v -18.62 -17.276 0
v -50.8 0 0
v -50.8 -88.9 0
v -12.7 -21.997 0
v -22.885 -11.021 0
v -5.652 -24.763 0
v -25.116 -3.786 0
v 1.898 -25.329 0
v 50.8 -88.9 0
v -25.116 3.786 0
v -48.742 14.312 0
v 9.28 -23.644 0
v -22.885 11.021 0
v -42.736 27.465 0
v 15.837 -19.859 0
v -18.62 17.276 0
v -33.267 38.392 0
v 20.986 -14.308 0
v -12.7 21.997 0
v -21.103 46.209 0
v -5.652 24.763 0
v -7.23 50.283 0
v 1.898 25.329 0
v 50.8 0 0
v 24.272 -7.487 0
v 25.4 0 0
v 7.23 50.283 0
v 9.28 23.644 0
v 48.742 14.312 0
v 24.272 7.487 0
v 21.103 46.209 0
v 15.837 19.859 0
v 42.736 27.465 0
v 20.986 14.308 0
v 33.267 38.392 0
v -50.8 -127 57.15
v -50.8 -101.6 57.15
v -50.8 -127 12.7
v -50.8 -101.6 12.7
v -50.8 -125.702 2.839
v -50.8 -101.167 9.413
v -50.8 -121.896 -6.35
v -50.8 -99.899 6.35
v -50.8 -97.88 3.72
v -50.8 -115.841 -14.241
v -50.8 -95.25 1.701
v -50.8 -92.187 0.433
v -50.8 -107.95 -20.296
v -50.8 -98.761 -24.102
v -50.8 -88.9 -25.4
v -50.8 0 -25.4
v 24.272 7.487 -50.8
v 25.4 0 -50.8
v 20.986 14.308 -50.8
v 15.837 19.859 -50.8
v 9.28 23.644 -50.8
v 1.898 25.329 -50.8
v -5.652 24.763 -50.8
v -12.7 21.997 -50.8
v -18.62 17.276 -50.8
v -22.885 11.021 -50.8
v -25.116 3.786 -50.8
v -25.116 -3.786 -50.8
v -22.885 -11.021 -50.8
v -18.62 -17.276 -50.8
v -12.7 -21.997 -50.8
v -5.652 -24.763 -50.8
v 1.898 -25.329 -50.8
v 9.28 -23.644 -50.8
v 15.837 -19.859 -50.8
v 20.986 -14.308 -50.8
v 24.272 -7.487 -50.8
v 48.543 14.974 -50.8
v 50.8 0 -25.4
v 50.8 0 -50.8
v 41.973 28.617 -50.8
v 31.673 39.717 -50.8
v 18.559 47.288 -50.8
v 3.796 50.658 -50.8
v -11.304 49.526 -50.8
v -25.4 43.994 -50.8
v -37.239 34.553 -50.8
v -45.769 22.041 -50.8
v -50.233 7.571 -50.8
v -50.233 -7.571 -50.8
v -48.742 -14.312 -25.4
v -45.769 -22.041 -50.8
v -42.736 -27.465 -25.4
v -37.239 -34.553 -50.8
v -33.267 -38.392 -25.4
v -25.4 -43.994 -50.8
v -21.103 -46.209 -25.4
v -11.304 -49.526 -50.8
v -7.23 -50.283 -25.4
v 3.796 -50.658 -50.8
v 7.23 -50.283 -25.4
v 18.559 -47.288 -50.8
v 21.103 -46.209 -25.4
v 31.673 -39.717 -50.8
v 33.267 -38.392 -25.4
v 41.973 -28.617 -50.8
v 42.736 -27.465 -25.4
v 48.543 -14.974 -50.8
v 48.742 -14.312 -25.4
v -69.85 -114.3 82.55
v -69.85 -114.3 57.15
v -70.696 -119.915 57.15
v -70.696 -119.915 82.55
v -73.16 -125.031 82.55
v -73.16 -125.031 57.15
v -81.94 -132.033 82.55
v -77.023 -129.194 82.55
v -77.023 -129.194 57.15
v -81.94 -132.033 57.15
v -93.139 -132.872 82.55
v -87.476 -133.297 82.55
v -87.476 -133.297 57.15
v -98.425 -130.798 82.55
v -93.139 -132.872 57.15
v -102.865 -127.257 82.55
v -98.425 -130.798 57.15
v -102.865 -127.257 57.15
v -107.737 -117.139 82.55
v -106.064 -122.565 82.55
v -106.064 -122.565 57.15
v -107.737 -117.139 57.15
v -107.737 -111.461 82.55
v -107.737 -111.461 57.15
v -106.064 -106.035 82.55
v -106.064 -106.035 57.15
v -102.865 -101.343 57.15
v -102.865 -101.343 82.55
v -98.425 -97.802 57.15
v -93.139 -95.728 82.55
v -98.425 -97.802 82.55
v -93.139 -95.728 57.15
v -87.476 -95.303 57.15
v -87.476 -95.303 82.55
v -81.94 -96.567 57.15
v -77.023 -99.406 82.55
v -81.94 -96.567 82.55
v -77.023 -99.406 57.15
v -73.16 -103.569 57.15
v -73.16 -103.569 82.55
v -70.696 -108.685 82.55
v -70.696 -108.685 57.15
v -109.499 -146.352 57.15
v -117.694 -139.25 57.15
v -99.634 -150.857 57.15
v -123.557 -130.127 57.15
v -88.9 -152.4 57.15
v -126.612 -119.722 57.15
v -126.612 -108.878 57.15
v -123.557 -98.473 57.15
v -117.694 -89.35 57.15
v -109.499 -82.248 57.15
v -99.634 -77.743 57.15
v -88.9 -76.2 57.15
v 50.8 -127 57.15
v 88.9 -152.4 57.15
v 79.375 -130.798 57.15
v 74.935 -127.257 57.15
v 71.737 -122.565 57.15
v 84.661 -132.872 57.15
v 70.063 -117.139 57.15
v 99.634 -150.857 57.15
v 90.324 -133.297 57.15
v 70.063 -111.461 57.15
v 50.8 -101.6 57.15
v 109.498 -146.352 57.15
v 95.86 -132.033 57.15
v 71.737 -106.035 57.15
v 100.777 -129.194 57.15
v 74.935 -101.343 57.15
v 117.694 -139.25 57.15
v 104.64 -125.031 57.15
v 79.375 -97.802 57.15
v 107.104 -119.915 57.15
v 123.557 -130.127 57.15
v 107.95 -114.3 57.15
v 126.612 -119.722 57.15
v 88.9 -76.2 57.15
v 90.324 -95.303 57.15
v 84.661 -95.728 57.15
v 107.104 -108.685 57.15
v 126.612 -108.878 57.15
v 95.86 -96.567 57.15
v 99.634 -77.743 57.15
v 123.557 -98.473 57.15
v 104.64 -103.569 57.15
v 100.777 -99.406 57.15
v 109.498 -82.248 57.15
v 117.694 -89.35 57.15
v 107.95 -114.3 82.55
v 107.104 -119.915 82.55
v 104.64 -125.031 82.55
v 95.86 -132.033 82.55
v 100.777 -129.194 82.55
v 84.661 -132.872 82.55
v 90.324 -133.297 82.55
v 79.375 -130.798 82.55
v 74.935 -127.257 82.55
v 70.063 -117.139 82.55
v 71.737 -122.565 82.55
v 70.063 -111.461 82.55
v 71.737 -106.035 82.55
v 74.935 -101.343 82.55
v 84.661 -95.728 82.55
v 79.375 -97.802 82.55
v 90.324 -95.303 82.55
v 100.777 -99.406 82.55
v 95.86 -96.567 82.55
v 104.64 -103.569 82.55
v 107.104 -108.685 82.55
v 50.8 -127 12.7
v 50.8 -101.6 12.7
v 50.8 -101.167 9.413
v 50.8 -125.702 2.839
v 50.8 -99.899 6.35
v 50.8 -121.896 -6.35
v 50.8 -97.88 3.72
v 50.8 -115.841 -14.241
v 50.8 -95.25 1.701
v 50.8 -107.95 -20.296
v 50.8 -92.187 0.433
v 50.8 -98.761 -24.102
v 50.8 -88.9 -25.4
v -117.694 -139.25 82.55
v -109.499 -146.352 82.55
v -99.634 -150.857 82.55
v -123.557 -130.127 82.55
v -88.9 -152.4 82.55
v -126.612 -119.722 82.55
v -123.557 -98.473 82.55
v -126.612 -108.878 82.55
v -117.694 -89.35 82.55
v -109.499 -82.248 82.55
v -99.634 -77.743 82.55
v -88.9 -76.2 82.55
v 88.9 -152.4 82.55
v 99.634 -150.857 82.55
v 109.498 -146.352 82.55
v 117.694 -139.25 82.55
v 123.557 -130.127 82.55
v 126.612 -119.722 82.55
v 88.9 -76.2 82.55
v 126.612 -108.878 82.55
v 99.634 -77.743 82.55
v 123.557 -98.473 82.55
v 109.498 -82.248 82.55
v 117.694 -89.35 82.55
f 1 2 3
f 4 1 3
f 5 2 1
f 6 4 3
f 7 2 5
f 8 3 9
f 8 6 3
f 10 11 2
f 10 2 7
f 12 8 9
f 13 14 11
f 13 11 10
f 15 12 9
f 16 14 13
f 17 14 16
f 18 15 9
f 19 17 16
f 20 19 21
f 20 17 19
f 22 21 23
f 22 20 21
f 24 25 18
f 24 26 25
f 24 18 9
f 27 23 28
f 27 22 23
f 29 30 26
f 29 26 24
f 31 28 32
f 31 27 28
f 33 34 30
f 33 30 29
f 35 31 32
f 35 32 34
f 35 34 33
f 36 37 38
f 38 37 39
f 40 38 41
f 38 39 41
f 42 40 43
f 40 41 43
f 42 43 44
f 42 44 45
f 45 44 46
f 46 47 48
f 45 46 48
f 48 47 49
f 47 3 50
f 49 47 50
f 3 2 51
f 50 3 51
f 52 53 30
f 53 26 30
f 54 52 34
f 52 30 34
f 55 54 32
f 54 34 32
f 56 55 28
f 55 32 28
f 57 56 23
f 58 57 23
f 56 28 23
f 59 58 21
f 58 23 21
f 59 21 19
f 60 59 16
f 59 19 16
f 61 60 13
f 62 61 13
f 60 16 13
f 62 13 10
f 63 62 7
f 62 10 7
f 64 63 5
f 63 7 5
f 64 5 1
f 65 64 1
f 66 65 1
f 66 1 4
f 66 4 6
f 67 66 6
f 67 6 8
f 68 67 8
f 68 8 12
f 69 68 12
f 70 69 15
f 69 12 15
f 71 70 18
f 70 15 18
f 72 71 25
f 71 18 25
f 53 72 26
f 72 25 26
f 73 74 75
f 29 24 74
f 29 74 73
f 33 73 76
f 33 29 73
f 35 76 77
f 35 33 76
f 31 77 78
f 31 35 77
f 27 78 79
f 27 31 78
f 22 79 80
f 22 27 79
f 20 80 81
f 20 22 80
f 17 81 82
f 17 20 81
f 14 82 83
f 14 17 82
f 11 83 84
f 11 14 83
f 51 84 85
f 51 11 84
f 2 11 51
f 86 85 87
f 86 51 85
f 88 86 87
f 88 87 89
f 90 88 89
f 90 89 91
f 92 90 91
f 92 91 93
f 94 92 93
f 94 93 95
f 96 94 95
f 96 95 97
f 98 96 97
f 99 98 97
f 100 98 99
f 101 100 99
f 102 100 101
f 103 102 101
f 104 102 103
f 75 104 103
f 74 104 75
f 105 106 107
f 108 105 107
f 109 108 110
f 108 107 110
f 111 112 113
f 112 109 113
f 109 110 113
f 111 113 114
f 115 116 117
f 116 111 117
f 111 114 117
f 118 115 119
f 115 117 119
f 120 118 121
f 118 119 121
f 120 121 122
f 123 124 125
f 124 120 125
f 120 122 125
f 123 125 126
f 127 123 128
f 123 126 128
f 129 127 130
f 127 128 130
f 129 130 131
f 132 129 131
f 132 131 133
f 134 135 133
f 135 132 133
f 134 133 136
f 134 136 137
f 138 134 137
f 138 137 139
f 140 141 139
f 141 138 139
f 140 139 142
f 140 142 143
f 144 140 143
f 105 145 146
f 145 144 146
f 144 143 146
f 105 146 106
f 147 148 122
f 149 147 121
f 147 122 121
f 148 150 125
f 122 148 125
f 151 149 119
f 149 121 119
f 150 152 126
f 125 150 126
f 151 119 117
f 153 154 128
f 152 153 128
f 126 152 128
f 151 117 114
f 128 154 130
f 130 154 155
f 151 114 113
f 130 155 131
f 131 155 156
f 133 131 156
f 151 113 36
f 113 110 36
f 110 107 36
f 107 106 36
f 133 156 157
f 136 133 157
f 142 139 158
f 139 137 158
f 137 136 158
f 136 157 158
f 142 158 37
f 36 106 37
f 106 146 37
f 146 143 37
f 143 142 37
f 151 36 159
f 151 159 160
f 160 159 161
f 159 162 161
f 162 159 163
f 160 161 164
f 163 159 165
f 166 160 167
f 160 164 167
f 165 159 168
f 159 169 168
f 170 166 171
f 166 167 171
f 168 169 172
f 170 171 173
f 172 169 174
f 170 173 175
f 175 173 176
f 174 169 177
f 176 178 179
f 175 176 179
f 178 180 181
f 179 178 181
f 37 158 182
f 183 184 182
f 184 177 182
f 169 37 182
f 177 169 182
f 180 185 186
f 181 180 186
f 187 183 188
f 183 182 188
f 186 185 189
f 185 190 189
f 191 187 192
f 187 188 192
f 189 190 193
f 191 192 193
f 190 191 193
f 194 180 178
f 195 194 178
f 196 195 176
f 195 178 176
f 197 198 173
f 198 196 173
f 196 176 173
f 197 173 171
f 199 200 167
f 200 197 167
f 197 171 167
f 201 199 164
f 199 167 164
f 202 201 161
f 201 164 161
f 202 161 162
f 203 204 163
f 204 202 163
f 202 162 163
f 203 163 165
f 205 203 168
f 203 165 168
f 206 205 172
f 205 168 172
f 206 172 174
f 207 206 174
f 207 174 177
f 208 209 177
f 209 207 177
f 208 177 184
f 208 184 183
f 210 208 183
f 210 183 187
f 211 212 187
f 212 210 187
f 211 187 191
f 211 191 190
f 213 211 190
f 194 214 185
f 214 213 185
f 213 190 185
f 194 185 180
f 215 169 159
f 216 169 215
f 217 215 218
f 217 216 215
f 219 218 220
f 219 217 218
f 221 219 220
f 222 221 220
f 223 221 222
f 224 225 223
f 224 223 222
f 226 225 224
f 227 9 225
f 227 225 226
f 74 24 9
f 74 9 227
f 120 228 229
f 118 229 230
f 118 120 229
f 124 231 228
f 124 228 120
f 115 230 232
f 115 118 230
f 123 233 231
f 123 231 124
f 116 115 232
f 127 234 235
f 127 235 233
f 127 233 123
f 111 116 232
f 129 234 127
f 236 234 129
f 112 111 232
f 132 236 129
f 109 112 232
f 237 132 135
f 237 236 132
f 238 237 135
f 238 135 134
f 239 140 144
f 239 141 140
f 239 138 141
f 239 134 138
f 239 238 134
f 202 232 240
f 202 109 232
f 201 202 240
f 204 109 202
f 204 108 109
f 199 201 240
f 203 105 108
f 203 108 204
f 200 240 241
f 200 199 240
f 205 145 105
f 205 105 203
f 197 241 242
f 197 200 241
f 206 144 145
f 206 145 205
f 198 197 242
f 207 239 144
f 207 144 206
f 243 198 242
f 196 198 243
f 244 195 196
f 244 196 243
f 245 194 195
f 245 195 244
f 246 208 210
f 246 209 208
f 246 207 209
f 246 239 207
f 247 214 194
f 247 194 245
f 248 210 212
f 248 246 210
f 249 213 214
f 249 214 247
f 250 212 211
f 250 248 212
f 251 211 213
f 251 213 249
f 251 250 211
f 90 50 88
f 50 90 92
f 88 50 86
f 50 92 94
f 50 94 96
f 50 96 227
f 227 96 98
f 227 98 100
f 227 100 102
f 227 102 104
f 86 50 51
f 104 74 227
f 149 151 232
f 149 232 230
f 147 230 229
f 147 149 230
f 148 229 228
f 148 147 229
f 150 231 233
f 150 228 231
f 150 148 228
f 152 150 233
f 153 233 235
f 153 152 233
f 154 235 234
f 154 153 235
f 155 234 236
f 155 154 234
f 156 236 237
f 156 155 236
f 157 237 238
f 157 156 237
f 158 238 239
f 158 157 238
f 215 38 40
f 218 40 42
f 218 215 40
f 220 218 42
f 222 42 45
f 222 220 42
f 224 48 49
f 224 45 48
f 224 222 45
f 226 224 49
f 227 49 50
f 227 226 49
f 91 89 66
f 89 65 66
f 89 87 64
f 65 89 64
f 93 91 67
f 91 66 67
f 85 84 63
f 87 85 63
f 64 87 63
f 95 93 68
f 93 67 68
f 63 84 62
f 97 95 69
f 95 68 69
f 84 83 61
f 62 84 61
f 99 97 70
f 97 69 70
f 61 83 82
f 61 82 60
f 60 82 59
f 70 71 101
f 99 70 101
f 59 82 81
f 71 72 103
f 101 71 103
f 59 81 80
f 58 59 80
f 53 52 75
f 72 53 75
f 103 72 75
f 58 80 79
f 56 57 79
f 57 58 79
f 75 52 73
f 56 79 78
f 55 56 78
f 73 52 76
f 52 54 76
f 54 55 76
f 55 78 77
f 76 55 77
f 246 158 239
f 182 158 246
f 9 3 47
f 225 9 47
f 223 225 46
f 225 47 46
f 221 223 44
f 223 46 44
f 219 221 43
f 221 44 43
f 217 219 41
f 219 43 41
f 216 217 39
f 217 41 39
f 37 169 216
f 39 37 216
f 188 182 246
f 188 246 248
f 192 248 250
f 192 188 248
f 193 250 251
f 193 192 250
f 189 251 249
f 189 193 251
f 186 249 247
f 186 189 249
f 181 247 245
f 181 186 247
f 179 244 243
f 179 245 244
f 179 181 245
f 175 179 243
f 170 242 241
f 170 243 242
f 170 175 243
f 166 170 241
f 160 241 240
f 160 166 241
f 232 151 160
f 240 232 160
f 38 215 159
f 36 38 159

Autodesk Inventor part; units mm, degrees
ref_plane "YZ Plane" through (0, 0, 0) normal (1, 0, 0) x (0, 1, 0)
ref_plane "XZ Plane" through (0, 0, 0) normal (0, 1, 0) x (-1, 0, 0)
ref_plane "XY Plane" through (0, 0, 0) normal (0, 0, 1) x (1, 0, 0)
sketch "Sketch1" plane through (0, 0, 0) normal (0, 0, 1) x (1, 0, 0)
  circle A0 centre (0, 0) radius 25.4
  circle A1 centre (0, 0) radius 50.8
  dimension "d0" = 50.8
  dimension "d1" = 101.6
extrude "Extrusion1" add sketch "Sketch1" against normal blind 50.8
sketch "Sketch2" plane through (0, 0, 0) normal (0, 0, 1) x (1, 0, 0)
  circle A0 centre (0, 0) radius 50.8 projected
  line L0 (50.8, 0) -> (50.8, -127)
  line L1 (-50.8, 0) -> (-50.8, -127)
  line L2 (-50.8, -127) -> (50.8, -127)
  circle A1 centre (0, 0) radius 50.8
  dimension "d4" = 127
  dimension "d5" = 127
  dimension "d6" = 101.6
extrude "Extrusion2" add sketch "Sketch2" against normal blind 25.4 contours L0 L2 L1 A0
sketch "Sketch3" plane through (50.8, -127, 0) normal (1, 0, 0) x (0, 0, -1)
  line L0 (0, 0) -> (-57.15, 0)
  line L1 (-57.15, 0) -> (-57.15, 25.4)
  line L2 (-57.15, 25.4) -> (0, 25.4)
  line L3 (0, 25.4) -> (0, 0)
  point P0 (0, 127)
  dimension "d9" = 57.15
  dimension "d10" = 25.4
extrude "Extrusion3" add sketch "Sketch3" against normal blind 101.6
fillet "Fillet1" radius 12.7 1 edges at (0, -101.6, 0)
fillet "Fillet2" radius 38.1 1 edges at (0, -127, -25.4)
sketch "Sketch4" plane through (50.8, -127, 57.15) normal (0, 0, 1) x (1, 0, 0)
  line L0 (-139.7001, 50.8) -> (38.0999, 50.8)
  line L1 (-139.7001, -25.4) -> (38.1001, -25.4)
  arc A0 (-139.7001, 50.8) -> (-139.7001, -25.4) centre (-139.7001, 12.7) ccw
  arc A1 (38.1001, -25.4) -> (38.0999, 50.8) centre (38.1, 12.7) ccw
  line L2 (0, 0) -> (-101.6, 0) projected
  line L3 (-50.8, 0) -> (-50.8, -12.1544)
  line L4 (-50.8, -25.4) -> (-50.8, -31.0464)
  circle A2 centre (-139.7001, 12.7) radius 19.05
  circle A3 centre (38.1, 12.7) radius 19.05
  point P0 (-50.8, 127)
  dimension "d15" = 177.8
  dimension "d16" = 76.2
  dimension "d17" = 38.1
  dimension "d18" = 38.1
  dimension "d20" = 25.4
  dimension "d21" = 0
  dimension "d22" = 38.1
  dimension "d23" = 38.1
extrude "Extrusion4" add sketch "Sketch4" along normal blind 25.4
equation "\"d1\" = 2 * d0"
equation "\"d5\" = d4"
equation "\"d17\" = 0.5 * d16"
equation "\"d18\" = d17"
equation "\"d23\" = d22"
properties part number "HW 5 Part 6"
